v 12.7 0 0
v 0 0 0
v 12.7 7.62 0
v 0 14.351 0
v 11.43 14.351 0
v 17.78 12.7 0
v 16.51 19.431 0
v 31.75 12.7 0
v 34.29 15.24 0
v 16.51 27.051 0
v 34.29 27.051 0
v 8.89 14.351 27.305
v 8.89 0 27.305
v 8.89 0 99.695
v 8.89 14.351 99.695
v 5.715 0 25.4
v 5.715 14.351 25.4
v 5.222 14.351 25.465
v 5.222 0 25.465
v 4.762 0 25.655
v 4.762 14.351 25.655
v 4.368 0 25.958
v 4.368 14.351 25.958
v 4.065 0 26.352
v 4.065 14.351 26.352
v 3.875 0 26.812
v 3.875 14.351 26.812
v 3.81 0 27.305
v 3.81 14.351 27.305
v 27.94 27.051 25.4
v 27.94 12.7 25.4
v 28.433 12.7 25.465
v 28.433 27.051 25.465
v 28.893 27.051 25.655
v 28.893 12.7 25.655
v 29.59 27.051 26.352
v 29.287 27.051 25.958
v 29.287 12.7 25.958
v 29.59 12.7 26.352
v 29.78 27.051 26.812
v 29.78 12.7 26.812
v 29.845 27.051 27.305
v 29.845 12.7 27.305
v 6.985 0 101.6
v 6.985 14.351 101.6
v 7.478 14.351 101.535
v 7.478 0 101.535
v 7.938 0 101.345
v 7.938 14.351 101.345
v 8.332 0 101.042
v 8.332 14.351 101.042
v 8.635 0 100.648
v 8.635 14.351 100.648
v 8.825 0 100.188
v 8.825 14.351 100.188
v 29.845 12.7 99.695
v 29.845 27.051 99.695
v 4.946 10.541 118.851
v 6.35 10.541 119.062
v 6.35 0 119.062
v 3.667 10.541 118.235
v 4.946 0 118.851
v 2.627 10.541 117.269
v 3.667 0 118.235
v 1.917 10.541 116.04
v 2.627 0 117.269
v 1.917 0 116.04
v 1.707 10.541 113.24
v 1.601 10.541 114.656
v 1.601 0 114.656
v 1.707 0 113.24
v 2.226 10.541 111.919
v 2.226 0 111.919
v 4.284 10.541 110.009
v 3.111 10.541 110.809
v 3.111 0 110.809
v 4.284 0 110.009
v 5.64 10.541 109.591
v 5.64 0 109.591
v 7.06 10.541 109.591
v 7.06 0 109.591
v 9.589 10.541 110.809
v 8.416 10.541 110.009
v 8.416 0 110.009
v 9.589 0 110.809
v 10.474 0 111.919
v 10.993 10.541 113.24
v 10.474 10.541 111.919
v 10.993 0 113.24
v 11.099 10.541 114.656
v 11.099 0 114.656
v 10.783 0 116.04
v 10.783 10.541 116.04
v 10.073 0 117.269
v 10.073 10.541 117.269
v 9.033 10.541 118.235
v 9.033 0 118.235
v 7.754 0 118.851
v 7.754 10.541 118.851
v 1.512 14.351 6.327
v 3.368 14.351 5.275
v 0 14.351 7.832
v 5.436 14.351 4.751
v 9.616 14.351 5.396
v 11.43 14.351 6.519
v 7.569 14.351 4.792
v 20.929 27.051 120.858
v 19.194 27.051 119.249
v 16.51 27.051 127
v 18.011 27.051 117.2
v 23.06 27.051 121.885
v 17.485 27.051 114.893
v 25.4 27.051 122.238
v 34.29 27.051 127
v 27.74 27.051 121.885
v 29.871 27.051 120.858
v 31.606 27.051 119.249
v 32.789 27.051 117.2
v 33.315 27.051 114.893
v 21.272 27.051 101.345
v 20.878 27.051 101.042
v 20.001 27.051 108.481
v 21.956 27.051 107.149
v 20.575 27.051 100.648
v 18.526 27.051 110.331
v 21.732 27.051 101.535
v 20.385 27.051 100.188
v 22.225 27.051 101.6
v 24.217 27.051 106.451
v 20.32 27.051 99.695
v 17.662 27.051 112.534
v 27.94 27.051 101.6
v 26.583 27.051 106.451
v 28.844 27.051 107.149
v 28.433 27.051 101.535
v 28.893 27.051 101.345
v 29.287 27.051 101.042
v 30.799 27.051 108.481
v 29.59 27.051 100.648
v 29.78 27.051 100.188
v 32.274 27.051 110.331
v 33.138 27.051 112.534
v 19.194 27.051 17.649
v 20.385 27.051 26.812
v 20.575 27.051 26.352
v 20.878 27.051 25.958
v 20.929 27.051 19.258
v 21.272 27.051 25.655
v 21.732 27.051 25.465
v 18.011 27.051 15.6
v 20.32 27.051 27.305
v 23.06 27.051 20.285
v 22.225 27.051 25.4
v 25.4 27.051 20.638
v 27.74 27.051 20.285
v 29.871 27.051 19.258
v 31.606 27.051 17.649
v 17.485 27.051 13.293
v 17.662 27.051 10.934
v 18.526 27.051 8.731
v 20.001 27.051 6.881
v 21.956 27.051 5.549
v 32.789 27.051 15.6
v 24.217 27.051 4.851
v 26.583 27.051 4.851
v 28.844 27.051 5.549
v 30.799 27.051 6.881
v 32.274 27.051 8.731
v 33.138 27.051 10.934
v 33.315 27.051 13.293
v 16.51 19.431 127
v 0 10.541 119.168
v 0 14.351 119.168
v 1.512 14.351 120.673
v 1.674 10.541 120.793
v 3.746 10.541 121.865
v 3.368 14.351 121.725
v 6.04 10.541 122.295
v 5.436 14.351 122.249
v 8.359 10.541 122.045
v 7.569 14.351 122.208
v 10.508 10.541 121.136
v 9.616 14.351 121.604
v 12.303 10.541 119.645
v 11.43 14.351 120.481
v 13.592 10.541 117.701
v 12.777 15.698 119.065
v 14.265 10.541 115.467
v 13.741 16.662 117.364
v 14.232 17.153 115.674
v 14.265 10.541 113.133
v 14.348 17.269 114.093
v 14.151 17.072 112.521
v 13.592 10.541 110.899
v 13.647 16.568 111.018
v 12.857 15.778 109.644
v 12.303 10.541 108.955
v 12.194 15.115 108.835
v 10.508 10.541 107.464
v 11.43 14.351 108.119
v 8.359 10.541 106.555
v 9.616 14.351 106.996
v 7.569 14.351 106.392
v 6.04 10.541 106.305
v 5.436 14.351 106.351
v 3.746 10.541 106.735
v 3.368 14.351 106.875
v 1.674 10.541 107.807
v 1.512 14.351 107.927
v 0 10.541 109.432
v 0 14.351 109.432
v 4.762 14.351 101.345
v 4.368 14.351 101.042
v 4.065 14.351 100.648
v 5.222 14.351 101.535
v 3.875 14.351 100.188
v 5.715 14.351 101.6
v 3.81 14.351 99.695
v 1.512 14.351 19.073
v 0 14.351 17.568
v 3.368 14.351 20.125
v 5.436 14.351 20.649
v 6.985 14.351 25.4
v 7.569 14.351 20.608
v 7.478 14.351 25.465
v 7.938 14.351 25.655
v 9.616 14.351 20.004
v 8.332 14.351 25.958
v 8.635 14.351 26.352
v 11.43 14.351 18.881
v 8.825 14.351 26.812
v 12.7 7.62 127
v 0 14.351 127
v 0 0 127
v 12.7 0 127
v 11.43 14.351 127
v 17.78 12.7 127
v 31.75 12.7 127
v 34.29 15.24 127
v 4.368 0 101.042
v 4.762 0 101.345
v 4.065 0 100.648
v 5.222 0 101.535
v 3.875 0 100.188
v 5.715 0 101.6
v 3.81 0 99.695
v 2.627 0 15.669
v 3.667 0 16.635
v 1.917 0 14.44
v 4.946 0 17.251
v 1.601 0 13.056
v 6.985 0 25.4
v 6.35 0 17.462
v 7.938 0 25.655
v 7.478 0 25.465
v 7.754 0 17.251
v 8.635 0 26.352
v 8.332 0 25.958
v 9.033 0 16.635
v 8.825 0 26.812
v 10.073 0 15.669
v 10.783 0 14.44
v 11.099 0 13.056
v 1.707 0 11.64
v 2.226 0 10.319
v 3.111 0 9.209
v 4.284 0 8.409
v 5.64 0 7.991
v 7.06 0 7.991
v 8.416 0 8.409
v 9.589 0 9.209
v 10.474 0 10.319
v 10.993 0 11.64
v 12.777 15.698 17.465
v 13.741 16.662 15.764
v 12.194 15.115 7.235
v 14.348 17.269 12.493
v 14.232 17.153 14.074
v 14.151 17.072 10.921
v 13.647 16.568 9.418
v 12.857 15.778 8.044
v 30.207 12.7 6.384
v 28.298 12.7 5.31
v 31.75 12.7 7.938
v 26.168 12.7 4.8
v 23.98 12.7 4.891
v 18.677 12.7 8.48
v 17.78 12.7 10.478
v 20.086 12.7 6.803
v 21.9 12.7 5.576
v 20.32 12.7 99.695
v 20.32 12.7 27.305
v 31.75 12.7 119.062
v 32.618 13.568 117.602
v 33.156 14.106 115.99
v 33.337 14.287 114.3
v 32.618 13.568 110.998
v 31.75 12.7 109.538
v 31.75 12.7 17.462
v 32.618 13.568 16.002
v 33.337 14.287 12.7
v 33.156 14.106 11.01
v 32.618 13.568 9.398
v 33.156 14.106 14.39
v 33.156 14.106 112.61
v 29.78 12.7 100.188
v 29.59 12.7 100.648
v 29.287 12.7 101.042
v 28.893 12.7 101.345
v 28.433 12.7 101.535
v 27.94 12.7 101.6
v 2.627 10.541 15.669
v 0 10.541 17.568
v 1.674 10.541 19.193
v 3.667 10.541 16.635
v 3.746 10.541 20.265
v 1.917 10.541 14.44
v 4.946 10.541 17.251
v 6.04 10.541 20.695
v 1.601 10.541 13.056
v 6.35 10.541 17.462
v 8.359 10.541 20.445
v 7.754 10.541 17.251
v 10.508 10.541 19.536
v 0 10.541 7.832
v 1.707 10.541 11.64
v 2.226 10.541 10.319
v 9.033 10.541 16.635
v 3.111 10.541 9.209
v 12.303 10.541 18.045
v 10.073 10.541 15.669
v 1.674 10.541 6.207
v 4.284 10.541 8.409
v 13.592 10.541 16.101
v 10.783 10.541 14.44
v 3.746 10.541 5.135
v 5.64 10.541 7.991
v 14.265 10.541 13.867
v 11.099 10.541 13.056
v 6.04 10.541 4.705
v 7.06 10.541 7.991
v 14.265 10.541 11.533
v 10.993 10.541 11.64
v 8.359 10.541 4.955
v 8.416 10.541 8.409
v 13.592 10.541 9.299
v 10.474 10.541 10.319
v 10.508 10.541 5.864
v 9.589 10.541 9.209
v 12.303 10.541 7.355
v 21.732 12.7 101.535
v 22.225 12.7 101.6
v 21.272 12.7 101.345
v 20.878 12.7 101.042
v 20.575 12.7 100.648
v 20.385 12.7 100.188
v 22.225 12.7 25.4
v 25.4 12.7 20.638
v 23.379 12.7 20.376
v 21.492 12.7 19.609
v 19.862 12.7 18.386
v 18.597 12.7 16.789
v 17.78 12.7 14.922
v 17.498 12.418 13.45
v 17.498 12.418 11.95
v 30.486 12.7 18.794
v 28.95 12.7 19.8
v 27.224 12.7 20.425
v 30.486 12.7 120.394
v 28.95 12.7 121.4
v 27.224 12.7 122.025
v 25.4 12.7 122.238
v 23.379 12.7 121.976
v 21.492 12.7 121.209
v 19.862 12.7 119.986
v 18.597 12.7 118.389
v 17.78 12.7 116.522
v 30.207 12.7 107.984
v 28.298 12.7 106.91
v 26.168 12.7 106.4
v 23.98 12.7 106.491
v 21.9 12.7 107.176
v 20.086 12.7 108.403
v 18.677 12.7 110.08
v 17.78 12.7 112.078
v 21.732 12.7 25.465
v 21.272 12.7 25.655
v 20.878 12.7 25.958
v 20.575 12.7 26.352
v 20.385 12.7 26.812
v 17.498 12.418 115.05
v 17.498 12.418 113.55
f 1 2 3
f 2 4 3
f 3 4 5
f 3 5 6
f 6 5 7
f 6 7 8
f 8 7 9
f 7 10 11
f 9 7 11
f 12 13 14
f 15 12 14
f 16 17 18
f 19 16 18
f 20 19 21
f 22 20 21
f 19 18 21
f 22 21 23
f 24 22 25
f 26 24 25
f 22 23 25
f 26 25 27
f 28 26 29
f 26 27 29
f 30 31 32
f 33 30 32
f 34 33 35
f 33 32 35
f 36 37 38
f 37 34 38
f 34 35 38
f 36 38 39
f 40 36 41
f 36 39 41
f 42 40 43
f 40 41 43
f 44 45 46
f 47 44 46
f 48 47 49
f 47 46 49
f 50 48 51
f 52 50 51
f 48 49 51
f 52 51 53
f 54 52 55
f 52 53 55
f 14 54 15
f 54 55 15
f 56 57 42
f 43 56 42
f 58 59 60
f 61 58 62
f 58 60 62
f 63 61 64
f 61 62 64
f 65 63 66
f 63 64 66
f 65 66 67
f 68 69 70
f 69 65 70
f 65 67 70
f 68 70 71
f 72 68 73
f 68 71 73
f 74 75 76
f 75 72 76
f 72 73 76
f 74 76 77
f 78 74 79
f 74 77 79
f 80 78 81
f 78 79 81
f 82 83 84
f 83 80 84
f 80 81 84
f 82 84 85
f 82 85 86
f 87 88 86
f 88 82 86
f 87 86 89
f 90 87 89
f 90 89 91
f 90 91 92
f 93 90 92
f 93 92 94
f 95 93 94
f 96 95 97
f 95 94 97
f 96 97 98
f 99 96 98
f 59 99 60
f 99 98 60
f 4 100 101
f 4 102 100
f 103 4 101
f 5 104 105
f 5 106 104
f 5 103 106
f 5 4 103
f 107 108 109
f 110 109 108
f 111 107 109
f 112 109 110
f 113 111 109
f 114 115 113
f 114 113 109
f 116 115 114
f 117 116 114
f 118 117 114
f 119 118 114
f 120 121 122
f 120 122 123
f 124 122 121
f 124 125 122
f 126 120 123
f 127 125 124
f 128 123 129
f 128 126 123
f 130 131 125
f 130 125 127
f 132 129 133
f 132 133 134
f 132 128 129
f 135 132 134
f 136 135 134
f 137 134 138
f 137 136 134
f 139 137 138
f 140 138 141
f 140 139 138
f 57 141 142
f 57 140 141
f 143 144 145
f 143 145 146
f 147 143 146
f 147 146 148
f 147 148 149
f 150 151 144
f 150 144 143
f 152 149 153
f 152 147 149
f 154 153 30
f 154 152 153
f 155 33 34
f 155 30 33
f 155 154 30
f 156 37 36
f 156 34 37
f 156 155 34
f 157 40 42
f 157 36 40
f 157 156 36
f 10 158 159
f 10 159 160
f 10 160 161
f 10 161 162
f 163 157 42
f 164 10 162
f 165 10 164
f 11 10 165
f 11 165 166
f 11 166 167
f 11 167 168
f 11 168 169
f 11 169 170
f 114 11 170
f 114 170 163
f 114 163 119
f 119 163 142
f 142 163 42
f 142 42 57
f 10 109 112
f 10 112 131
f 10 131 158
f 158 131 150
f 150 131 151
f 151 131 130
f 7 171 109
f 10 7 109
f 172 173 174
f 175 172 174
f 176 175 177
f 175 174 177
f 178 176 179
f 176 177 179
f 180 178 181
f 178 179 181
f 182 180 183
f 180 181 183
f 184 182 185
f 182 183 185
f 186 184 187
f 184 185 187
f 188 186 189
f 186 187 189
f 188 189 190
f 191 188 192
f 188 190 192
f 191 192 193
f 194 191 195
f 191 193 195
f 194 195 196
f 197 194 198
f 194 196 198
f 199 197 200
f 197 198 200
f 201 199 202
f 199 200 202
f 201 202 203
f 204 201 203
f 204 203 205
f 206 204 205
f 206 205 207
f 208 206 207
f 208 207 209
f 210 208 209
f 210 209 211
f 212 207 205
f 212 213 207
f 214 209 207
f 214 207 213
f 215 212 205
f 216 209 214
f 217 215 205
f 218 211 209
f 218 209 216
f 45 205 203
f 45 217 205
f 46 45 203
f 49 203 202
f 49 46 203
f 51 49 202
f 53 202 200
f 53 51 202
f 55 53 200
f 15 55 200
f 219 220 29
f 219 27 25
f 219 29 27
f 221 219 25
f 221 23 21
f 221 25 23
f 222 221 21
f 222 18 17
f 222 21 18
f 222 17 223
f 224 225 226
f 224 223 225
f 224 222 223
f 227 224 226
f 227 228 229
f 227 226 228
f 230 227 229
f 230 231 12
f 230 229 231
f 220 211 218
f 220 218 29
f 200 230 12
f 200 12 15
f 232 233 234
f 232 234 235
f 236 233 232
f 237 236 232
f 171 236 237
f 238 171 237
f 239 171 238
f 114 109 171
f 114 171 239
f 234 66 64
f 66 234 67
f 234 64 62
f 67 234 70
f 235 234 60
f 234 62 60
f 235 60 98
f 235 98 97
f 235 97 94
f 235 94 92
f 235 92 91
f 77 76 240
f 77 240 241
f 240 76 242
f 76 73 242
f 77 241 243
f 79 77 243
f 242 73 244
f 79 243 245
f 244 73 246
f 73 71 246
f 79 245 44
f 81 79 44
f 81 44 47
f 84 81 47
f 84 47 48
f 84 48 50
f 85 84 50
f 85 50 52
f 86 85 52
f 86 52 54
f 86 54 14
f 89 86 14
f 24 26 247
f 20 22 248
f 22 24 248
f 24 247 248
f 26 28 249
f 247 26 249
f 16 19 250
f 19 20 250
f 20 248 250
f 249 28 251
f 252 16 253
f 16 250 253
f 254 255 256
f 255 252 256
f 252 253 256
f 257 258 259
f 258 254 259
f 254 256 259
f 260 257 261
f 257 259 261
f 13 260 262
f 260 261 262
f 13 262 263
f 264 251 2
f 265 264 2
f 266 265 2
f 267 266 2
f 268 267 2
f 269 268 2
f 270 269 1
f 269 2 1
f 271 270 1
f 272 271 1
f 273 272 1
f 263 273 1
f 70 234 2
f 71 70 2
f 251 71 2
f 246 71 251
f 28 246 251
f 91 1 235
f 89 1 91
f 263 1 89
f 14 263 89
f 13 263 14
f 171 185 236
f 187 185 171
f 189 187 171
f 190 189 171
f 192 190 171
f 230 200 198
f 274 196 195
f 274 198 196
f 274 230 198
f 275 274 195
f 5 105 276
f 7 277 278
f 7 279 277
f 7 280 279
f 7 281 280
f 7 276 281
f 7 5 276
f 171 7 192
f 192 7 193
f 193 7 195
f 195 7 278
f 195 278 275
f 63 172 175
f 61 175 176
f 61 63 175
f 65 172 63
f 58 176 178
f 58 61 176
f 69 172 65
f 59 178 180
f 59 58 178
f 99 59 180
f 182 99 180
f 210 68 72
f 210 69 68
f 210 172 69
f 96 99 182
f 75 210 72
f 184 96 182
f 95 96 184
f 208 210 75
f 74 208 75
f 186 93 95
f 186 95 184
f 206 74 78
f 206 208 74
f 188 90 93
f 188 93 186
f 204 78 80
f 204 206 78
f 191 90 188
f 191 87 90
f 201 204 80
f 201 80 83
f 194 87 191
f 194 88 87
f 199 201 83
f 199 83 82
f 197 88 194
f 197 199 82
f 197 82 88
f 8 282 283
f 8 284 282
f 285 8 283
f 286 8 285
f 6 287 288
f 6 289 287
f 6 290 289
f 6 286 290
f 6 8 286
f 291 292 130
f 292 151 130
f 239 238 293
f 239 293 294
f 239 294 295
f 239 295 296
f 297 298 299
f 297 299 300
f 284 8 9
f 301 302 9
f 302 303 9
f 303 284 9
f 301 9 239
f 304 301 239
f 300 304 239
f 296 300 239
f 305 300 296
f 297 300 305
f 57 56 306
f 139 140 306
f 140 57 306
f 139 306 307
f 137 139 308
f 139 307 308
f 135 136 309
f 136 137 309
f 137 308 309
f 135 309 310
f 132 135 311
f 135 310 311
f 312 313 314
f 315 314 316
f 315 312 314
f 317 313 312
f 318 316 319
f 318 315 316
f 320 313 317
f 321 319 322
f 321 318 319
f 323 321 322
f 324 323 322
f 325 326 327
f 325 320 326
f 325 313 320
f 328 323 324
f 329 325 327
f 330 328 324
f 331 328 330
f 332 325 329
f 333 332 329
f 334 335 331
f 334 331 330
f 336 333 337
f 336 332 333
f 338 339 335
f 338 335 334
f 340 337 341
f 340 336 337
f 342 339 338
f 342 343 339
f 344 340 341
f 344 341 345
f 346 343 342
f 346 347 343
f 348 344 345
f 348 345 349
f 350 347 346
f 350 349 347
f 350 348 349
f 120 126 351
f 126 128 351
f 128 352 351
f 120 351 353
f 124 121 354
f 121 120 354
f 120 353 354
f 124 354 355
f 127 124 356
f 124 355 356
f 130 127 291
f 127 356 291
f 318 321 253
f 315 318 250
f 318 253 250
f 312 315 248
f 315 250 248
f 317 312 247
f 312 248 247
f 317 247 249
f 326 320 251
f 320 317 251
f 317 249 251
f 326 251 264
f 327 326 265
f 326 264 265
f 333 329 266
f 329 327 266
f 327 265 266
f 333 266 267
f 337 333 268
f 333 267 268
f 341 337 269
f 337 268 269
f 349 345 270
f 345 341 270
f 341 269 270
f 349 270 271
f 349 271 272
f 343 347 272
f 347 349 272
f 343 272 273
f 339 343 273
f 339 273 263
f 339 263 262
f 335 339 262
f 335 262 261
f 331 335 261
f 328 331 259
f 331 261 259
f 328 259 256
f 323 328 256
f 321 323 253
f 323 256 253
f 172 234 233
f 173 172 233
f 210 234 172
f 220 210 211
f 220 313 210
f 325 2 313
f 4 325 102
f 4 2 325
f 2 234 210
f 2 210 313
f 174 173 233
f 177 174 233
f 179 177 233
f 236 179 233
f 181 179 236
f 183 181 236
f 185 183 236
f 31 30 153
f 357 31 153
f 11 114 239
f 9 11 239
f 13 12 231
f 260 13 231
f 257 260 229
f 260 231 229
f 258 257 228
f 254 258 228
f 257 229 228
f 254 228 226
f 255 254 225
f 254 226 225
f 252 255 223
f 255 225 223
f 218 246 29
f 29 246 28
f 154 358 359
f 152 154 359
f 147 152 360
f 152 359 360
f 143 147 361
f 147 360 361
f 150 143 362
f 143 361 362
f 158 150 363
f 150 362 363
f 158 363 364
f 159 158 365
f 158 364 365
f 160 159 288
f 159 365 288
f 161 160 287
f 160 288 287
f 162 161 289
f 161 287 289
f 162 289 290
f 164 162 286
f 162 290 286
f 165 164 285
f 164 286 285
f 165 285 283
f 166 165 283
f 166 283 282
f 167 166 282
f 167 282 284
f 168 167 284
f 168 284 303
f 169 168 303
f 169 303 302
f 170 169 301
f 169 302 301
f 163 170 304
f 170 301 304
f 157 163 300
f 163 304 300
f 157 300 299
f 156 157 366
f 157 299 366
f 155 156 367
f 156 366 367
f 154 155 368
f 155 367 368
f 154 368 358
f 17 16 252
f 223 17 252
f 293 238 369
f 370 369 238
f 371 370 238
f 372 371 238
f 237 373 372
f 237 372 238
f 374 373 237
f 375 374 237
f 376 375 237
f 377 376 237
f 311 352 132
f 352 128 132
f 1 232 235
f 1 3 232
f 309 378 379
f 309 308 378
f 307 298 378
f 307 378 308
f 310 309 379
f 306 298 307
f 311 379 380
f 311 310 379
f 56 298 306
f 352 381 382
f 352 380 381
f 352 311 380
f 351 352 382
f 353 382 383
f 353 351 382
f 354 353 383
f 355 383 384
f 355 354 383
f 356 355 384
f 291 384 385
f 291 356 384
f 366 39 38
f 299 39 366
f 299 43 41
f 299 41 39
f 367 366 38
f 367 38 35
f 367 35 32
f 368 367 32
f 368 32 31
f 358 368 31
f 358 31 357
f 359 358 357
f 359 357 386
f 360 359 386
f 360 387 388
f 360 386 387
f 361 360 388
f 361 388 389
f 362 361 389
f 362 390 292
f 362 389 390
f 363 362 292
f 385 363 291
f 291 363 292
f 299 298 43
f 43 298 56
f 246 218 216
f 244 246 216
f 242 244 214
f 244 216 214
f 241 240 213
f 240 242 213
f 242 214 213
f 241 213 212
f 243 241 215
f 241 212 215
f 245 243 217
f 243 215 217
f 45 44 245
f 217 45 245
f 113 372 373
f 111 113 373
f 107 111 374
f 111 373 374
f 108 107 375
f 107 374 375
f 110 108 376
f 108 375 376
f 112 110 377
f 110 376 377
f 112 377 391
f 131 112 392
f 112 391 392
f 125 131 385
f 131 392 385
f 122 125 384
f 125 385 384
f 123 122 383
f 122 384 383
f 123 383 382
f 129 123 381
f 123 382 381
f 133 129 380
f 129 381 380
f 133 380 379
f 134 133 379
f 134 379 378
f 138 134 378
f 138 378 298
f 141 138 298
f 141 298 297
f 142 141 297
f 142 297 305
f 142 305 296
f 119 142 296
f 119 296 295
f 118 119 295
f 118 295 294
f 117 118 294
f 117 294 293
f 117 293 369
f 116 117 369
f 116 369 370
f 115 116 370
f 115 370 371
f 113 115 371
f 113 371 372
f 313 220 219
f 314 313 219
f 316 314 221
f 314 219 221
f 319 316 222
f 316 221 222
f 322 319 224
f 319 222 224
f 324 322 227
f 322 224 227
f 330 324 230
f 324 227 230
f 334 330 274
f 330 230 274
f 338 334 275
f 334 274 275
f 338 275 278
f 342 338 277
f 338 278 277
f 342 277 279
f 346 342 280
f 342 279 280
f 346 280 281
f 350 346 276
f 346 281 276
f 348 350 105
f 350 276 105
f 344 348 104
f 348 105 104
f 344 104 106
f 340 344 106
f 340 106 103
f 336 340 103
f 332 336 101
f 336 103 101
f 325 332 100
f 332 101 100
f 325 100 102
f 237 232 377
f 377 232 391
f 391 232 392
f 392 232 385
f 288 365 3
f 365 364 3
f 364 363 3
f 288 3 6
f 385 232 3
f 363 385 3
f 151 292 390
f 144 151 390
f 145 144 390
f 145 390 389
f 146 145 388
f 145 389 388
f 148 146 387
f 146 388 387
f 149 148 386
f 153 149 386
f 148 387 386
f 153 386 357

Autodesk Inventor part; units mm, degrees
ref_plane "YZ Plane" through (0, 0, 0) normal (1, 0, 0) x (0, 1, 0)
ref_plane "XZ Plane" through (0, 0, 0) normal (0, 1, 0) x (-1, 0, 0)
ref_plane "XY Plane" through (0, 0, 0) normal (0, 0, 1) x (1, 0, 0)
sketch "Sketch1" plane through (0, 0, 0) normal (0, 0, 1) x (1, 0, 0)
  line L0 (0, 0) -> (0, 14.351)
  line L1 (0, 0) -> (14.351, 0) construction
  line L2 (0, 14.351) -> (16.51, 14.351)
  line L3 (16.51, 14.351) -> (16.51, 27.051)
  line L4 (16.51, 27.051) -> (34.29, 27.051)
  line L5 (34.29, 27.051) -> (34.29, 12.7)
  line L6 (34.29, 12.7) -> (12.7, 12.7)
  line L7 (12.7, 12.7) -> (12.7, 0)
  line L8 (0, 0) -> (12.7, 0)
  dimension "d0" = 14.351
  dimension "d2" = 16.51
  dimension "d6" = 17.78
  dimension "d9" = 21.59
  dimension "d47" = 14.351
  dimension "d49" = 12.7
extrude "Extrusion1" add sketch "Sketch1" along normal blind 127
sketch "Sketch3" plane through (16.51, 27.051, 0) normal (0, 1, 0) x (1, 0, 0)
  line L0 (0, -127) -> (-16.51, -127) projected
  line L1 (-16.51, 0) -> (0, 0) projected
  line L2 (-16.51, 0) -> (-16.51, -127) projected
  point P0 (-10.16, -12.7)
  point P1 (-10.16, -114.3)
  dimension "d25" = 12.7
  dimension "d26" = 12.7
  dimension "d27" = 6.35
  dimension "d28" = 6.35
hole "Hole2" at (6.35, 27.051, 12.7) at (6.35, 27.051, 114.3) direction (0, -1, 0) diameter 9.525 end through all
sketch "Sketch4" plane through (16.51, 27.051, 0) normal (0, 1, 0) x (1, 0, 0)
  line L0 (17.78, 0) -> (17.78, -127) projected
  line L1 (17.78, -127) -> (0, -127) projected
  line L2 (0, 0) -> (17.78, 0) projected
  line L3 (0, 0) -> (0, -127) projected
  point P0 (-16.51, 0)
  point P1 (8.89, -12.7)
  point P2 (8.89, -114.3)
  dimension "d36" = 8.89
  dimension "d37" = 12.7
  dimension "d38" = 12.7
  dimension "d48" = 17.78
hole "Hole3" at (25.4, 27.051, 12.7) at (25.4, 27.051, 114.3) direction (0, -1, 0) diameter 15.875 end through all
sketch "Sketch5" plane through (16.51, 27.051, 0) normal (0, 1, 0) x (1, 0, 0)
  line L0 (3.81, -101.6) -> (13.335, -101.6)
  line L1 (13.335, -101.6) -> (13.335, -25.4)
  line L2 (13.335, -25.4) -> (3.81, -25.4)
  line L3 (3.81, -25.4) -> (3.81, -101.6)
  line L4 (17.78, -127) -> (0, -127) projected
  line L5 (17.78, 0) -> (17.78, -127) projected
  line L6 (0, 0) -> (17.78, 0) projected
  point P0 (-16.51, 0)
  dimension "d50" = 25.4
  dimension "d51" = 4.445
  dimension "d52" = 25.4
  dimension "d53" = 9.525
extrude "Extrusion2" cut sketch "Sketch5" against normal blind 25.4
sketch "Sketch6" plane through (0, 0, 0) normal (0, -1, 0) x (1, 0, 0)
  line L0 (3.81, 25.4) -> (8.89, 25.4)
  line L1 (8.89, 25.4) -> (8.89, 101.6)
  line L2 (8.89, 101.6) -> (3.81, 101.6)
  line L3 (3.81, 101.6) -> (3.81, 25.4)
  line L4 (20.32, 101.6) -> (29.845, 101.6) projected
  line L5 (29.845, 25.4) -> (20.32, 25.4) projected
  line L6 (0, 0) -> (0, 127) projected
  line L7 (12.7, 0) -> (12.7, 127) projected
  dimension "d57" = 3.81
  dimension "d58" = 3.81
extrude "Extrusion3" cut sketch "Sketch6" against normal blind 25.4
fillet "Fillet1" radius 1.905 8 edges at (20.32, 19.8755, 25.4) (29.845, 19.8755, 25.4) (20.32, 19.8755, 101.6) (29.845, 19.8755, 101.6) (3.81, 7.1755, 101.6) (8.89, 7.1755, 101.6) (8.89, 7.1755, 25.4) (3.81, 7.1755, 25.4)
chamfer "Chamfer1" distance 5.08 angle 45 2 edges at (16.51, 14.351, 63.5) (12.7, 12.7, 63.5)
sketch "Sketch7" plane through (0, 14.351, 127) normal (0, 1, 0) x (1, 0, 0)
  circle A0 centre (6.35, 114.3) radius 4.7625 projected
  circle A1 centre (6.35, 114.3) radius 8.001
  circle A2 centre (6.35, 12.7) radius 4.7625 projected
  circle A3 centre (6.35, 12.7) radius 8.001
  point P0 (0, 127)
  dimension "d65" = 16.002
  dimension "d66" = 16.002
extrude "Extrusion4" cut sketch "Sketch7" against normal blind 3.81
sketch "Sketch8" plane through (0, 14.351, 0) normal (0, 1, 0) x (1, 0, 0)
  arc A0 (0, -17.5676) -> (11.43, -18.8814) centre (6.35, -12.7) ccw projected
  circle A1 centre (6.35, -12.7) radius 8.001
  arc A2 (11.43, -108.1186) -> (0, -109.4324) centre (6.35, -114.3) ccw projected
  circle A3 centre (6.35, -114.3) radius 8.001
  point P0 (0, 0)
extrude "Extrusion5" cut sketch "Sketch8" along normal blind 3.81
chamfer "Chamfer2" distance 2.54 angle 45 1 edges at (34.29, 12.7, 63.5)
equation "\"d0\" = d47"
equation "\"d26\" = d25"
equation "\"d28\" = d27"
equation "\"d36\" = 0.5 * d48"
equation "\"d38\" = d37"
equation "\"d58\" = d57"
properties part number "Block_3-8" material "Aluminum 6061"
